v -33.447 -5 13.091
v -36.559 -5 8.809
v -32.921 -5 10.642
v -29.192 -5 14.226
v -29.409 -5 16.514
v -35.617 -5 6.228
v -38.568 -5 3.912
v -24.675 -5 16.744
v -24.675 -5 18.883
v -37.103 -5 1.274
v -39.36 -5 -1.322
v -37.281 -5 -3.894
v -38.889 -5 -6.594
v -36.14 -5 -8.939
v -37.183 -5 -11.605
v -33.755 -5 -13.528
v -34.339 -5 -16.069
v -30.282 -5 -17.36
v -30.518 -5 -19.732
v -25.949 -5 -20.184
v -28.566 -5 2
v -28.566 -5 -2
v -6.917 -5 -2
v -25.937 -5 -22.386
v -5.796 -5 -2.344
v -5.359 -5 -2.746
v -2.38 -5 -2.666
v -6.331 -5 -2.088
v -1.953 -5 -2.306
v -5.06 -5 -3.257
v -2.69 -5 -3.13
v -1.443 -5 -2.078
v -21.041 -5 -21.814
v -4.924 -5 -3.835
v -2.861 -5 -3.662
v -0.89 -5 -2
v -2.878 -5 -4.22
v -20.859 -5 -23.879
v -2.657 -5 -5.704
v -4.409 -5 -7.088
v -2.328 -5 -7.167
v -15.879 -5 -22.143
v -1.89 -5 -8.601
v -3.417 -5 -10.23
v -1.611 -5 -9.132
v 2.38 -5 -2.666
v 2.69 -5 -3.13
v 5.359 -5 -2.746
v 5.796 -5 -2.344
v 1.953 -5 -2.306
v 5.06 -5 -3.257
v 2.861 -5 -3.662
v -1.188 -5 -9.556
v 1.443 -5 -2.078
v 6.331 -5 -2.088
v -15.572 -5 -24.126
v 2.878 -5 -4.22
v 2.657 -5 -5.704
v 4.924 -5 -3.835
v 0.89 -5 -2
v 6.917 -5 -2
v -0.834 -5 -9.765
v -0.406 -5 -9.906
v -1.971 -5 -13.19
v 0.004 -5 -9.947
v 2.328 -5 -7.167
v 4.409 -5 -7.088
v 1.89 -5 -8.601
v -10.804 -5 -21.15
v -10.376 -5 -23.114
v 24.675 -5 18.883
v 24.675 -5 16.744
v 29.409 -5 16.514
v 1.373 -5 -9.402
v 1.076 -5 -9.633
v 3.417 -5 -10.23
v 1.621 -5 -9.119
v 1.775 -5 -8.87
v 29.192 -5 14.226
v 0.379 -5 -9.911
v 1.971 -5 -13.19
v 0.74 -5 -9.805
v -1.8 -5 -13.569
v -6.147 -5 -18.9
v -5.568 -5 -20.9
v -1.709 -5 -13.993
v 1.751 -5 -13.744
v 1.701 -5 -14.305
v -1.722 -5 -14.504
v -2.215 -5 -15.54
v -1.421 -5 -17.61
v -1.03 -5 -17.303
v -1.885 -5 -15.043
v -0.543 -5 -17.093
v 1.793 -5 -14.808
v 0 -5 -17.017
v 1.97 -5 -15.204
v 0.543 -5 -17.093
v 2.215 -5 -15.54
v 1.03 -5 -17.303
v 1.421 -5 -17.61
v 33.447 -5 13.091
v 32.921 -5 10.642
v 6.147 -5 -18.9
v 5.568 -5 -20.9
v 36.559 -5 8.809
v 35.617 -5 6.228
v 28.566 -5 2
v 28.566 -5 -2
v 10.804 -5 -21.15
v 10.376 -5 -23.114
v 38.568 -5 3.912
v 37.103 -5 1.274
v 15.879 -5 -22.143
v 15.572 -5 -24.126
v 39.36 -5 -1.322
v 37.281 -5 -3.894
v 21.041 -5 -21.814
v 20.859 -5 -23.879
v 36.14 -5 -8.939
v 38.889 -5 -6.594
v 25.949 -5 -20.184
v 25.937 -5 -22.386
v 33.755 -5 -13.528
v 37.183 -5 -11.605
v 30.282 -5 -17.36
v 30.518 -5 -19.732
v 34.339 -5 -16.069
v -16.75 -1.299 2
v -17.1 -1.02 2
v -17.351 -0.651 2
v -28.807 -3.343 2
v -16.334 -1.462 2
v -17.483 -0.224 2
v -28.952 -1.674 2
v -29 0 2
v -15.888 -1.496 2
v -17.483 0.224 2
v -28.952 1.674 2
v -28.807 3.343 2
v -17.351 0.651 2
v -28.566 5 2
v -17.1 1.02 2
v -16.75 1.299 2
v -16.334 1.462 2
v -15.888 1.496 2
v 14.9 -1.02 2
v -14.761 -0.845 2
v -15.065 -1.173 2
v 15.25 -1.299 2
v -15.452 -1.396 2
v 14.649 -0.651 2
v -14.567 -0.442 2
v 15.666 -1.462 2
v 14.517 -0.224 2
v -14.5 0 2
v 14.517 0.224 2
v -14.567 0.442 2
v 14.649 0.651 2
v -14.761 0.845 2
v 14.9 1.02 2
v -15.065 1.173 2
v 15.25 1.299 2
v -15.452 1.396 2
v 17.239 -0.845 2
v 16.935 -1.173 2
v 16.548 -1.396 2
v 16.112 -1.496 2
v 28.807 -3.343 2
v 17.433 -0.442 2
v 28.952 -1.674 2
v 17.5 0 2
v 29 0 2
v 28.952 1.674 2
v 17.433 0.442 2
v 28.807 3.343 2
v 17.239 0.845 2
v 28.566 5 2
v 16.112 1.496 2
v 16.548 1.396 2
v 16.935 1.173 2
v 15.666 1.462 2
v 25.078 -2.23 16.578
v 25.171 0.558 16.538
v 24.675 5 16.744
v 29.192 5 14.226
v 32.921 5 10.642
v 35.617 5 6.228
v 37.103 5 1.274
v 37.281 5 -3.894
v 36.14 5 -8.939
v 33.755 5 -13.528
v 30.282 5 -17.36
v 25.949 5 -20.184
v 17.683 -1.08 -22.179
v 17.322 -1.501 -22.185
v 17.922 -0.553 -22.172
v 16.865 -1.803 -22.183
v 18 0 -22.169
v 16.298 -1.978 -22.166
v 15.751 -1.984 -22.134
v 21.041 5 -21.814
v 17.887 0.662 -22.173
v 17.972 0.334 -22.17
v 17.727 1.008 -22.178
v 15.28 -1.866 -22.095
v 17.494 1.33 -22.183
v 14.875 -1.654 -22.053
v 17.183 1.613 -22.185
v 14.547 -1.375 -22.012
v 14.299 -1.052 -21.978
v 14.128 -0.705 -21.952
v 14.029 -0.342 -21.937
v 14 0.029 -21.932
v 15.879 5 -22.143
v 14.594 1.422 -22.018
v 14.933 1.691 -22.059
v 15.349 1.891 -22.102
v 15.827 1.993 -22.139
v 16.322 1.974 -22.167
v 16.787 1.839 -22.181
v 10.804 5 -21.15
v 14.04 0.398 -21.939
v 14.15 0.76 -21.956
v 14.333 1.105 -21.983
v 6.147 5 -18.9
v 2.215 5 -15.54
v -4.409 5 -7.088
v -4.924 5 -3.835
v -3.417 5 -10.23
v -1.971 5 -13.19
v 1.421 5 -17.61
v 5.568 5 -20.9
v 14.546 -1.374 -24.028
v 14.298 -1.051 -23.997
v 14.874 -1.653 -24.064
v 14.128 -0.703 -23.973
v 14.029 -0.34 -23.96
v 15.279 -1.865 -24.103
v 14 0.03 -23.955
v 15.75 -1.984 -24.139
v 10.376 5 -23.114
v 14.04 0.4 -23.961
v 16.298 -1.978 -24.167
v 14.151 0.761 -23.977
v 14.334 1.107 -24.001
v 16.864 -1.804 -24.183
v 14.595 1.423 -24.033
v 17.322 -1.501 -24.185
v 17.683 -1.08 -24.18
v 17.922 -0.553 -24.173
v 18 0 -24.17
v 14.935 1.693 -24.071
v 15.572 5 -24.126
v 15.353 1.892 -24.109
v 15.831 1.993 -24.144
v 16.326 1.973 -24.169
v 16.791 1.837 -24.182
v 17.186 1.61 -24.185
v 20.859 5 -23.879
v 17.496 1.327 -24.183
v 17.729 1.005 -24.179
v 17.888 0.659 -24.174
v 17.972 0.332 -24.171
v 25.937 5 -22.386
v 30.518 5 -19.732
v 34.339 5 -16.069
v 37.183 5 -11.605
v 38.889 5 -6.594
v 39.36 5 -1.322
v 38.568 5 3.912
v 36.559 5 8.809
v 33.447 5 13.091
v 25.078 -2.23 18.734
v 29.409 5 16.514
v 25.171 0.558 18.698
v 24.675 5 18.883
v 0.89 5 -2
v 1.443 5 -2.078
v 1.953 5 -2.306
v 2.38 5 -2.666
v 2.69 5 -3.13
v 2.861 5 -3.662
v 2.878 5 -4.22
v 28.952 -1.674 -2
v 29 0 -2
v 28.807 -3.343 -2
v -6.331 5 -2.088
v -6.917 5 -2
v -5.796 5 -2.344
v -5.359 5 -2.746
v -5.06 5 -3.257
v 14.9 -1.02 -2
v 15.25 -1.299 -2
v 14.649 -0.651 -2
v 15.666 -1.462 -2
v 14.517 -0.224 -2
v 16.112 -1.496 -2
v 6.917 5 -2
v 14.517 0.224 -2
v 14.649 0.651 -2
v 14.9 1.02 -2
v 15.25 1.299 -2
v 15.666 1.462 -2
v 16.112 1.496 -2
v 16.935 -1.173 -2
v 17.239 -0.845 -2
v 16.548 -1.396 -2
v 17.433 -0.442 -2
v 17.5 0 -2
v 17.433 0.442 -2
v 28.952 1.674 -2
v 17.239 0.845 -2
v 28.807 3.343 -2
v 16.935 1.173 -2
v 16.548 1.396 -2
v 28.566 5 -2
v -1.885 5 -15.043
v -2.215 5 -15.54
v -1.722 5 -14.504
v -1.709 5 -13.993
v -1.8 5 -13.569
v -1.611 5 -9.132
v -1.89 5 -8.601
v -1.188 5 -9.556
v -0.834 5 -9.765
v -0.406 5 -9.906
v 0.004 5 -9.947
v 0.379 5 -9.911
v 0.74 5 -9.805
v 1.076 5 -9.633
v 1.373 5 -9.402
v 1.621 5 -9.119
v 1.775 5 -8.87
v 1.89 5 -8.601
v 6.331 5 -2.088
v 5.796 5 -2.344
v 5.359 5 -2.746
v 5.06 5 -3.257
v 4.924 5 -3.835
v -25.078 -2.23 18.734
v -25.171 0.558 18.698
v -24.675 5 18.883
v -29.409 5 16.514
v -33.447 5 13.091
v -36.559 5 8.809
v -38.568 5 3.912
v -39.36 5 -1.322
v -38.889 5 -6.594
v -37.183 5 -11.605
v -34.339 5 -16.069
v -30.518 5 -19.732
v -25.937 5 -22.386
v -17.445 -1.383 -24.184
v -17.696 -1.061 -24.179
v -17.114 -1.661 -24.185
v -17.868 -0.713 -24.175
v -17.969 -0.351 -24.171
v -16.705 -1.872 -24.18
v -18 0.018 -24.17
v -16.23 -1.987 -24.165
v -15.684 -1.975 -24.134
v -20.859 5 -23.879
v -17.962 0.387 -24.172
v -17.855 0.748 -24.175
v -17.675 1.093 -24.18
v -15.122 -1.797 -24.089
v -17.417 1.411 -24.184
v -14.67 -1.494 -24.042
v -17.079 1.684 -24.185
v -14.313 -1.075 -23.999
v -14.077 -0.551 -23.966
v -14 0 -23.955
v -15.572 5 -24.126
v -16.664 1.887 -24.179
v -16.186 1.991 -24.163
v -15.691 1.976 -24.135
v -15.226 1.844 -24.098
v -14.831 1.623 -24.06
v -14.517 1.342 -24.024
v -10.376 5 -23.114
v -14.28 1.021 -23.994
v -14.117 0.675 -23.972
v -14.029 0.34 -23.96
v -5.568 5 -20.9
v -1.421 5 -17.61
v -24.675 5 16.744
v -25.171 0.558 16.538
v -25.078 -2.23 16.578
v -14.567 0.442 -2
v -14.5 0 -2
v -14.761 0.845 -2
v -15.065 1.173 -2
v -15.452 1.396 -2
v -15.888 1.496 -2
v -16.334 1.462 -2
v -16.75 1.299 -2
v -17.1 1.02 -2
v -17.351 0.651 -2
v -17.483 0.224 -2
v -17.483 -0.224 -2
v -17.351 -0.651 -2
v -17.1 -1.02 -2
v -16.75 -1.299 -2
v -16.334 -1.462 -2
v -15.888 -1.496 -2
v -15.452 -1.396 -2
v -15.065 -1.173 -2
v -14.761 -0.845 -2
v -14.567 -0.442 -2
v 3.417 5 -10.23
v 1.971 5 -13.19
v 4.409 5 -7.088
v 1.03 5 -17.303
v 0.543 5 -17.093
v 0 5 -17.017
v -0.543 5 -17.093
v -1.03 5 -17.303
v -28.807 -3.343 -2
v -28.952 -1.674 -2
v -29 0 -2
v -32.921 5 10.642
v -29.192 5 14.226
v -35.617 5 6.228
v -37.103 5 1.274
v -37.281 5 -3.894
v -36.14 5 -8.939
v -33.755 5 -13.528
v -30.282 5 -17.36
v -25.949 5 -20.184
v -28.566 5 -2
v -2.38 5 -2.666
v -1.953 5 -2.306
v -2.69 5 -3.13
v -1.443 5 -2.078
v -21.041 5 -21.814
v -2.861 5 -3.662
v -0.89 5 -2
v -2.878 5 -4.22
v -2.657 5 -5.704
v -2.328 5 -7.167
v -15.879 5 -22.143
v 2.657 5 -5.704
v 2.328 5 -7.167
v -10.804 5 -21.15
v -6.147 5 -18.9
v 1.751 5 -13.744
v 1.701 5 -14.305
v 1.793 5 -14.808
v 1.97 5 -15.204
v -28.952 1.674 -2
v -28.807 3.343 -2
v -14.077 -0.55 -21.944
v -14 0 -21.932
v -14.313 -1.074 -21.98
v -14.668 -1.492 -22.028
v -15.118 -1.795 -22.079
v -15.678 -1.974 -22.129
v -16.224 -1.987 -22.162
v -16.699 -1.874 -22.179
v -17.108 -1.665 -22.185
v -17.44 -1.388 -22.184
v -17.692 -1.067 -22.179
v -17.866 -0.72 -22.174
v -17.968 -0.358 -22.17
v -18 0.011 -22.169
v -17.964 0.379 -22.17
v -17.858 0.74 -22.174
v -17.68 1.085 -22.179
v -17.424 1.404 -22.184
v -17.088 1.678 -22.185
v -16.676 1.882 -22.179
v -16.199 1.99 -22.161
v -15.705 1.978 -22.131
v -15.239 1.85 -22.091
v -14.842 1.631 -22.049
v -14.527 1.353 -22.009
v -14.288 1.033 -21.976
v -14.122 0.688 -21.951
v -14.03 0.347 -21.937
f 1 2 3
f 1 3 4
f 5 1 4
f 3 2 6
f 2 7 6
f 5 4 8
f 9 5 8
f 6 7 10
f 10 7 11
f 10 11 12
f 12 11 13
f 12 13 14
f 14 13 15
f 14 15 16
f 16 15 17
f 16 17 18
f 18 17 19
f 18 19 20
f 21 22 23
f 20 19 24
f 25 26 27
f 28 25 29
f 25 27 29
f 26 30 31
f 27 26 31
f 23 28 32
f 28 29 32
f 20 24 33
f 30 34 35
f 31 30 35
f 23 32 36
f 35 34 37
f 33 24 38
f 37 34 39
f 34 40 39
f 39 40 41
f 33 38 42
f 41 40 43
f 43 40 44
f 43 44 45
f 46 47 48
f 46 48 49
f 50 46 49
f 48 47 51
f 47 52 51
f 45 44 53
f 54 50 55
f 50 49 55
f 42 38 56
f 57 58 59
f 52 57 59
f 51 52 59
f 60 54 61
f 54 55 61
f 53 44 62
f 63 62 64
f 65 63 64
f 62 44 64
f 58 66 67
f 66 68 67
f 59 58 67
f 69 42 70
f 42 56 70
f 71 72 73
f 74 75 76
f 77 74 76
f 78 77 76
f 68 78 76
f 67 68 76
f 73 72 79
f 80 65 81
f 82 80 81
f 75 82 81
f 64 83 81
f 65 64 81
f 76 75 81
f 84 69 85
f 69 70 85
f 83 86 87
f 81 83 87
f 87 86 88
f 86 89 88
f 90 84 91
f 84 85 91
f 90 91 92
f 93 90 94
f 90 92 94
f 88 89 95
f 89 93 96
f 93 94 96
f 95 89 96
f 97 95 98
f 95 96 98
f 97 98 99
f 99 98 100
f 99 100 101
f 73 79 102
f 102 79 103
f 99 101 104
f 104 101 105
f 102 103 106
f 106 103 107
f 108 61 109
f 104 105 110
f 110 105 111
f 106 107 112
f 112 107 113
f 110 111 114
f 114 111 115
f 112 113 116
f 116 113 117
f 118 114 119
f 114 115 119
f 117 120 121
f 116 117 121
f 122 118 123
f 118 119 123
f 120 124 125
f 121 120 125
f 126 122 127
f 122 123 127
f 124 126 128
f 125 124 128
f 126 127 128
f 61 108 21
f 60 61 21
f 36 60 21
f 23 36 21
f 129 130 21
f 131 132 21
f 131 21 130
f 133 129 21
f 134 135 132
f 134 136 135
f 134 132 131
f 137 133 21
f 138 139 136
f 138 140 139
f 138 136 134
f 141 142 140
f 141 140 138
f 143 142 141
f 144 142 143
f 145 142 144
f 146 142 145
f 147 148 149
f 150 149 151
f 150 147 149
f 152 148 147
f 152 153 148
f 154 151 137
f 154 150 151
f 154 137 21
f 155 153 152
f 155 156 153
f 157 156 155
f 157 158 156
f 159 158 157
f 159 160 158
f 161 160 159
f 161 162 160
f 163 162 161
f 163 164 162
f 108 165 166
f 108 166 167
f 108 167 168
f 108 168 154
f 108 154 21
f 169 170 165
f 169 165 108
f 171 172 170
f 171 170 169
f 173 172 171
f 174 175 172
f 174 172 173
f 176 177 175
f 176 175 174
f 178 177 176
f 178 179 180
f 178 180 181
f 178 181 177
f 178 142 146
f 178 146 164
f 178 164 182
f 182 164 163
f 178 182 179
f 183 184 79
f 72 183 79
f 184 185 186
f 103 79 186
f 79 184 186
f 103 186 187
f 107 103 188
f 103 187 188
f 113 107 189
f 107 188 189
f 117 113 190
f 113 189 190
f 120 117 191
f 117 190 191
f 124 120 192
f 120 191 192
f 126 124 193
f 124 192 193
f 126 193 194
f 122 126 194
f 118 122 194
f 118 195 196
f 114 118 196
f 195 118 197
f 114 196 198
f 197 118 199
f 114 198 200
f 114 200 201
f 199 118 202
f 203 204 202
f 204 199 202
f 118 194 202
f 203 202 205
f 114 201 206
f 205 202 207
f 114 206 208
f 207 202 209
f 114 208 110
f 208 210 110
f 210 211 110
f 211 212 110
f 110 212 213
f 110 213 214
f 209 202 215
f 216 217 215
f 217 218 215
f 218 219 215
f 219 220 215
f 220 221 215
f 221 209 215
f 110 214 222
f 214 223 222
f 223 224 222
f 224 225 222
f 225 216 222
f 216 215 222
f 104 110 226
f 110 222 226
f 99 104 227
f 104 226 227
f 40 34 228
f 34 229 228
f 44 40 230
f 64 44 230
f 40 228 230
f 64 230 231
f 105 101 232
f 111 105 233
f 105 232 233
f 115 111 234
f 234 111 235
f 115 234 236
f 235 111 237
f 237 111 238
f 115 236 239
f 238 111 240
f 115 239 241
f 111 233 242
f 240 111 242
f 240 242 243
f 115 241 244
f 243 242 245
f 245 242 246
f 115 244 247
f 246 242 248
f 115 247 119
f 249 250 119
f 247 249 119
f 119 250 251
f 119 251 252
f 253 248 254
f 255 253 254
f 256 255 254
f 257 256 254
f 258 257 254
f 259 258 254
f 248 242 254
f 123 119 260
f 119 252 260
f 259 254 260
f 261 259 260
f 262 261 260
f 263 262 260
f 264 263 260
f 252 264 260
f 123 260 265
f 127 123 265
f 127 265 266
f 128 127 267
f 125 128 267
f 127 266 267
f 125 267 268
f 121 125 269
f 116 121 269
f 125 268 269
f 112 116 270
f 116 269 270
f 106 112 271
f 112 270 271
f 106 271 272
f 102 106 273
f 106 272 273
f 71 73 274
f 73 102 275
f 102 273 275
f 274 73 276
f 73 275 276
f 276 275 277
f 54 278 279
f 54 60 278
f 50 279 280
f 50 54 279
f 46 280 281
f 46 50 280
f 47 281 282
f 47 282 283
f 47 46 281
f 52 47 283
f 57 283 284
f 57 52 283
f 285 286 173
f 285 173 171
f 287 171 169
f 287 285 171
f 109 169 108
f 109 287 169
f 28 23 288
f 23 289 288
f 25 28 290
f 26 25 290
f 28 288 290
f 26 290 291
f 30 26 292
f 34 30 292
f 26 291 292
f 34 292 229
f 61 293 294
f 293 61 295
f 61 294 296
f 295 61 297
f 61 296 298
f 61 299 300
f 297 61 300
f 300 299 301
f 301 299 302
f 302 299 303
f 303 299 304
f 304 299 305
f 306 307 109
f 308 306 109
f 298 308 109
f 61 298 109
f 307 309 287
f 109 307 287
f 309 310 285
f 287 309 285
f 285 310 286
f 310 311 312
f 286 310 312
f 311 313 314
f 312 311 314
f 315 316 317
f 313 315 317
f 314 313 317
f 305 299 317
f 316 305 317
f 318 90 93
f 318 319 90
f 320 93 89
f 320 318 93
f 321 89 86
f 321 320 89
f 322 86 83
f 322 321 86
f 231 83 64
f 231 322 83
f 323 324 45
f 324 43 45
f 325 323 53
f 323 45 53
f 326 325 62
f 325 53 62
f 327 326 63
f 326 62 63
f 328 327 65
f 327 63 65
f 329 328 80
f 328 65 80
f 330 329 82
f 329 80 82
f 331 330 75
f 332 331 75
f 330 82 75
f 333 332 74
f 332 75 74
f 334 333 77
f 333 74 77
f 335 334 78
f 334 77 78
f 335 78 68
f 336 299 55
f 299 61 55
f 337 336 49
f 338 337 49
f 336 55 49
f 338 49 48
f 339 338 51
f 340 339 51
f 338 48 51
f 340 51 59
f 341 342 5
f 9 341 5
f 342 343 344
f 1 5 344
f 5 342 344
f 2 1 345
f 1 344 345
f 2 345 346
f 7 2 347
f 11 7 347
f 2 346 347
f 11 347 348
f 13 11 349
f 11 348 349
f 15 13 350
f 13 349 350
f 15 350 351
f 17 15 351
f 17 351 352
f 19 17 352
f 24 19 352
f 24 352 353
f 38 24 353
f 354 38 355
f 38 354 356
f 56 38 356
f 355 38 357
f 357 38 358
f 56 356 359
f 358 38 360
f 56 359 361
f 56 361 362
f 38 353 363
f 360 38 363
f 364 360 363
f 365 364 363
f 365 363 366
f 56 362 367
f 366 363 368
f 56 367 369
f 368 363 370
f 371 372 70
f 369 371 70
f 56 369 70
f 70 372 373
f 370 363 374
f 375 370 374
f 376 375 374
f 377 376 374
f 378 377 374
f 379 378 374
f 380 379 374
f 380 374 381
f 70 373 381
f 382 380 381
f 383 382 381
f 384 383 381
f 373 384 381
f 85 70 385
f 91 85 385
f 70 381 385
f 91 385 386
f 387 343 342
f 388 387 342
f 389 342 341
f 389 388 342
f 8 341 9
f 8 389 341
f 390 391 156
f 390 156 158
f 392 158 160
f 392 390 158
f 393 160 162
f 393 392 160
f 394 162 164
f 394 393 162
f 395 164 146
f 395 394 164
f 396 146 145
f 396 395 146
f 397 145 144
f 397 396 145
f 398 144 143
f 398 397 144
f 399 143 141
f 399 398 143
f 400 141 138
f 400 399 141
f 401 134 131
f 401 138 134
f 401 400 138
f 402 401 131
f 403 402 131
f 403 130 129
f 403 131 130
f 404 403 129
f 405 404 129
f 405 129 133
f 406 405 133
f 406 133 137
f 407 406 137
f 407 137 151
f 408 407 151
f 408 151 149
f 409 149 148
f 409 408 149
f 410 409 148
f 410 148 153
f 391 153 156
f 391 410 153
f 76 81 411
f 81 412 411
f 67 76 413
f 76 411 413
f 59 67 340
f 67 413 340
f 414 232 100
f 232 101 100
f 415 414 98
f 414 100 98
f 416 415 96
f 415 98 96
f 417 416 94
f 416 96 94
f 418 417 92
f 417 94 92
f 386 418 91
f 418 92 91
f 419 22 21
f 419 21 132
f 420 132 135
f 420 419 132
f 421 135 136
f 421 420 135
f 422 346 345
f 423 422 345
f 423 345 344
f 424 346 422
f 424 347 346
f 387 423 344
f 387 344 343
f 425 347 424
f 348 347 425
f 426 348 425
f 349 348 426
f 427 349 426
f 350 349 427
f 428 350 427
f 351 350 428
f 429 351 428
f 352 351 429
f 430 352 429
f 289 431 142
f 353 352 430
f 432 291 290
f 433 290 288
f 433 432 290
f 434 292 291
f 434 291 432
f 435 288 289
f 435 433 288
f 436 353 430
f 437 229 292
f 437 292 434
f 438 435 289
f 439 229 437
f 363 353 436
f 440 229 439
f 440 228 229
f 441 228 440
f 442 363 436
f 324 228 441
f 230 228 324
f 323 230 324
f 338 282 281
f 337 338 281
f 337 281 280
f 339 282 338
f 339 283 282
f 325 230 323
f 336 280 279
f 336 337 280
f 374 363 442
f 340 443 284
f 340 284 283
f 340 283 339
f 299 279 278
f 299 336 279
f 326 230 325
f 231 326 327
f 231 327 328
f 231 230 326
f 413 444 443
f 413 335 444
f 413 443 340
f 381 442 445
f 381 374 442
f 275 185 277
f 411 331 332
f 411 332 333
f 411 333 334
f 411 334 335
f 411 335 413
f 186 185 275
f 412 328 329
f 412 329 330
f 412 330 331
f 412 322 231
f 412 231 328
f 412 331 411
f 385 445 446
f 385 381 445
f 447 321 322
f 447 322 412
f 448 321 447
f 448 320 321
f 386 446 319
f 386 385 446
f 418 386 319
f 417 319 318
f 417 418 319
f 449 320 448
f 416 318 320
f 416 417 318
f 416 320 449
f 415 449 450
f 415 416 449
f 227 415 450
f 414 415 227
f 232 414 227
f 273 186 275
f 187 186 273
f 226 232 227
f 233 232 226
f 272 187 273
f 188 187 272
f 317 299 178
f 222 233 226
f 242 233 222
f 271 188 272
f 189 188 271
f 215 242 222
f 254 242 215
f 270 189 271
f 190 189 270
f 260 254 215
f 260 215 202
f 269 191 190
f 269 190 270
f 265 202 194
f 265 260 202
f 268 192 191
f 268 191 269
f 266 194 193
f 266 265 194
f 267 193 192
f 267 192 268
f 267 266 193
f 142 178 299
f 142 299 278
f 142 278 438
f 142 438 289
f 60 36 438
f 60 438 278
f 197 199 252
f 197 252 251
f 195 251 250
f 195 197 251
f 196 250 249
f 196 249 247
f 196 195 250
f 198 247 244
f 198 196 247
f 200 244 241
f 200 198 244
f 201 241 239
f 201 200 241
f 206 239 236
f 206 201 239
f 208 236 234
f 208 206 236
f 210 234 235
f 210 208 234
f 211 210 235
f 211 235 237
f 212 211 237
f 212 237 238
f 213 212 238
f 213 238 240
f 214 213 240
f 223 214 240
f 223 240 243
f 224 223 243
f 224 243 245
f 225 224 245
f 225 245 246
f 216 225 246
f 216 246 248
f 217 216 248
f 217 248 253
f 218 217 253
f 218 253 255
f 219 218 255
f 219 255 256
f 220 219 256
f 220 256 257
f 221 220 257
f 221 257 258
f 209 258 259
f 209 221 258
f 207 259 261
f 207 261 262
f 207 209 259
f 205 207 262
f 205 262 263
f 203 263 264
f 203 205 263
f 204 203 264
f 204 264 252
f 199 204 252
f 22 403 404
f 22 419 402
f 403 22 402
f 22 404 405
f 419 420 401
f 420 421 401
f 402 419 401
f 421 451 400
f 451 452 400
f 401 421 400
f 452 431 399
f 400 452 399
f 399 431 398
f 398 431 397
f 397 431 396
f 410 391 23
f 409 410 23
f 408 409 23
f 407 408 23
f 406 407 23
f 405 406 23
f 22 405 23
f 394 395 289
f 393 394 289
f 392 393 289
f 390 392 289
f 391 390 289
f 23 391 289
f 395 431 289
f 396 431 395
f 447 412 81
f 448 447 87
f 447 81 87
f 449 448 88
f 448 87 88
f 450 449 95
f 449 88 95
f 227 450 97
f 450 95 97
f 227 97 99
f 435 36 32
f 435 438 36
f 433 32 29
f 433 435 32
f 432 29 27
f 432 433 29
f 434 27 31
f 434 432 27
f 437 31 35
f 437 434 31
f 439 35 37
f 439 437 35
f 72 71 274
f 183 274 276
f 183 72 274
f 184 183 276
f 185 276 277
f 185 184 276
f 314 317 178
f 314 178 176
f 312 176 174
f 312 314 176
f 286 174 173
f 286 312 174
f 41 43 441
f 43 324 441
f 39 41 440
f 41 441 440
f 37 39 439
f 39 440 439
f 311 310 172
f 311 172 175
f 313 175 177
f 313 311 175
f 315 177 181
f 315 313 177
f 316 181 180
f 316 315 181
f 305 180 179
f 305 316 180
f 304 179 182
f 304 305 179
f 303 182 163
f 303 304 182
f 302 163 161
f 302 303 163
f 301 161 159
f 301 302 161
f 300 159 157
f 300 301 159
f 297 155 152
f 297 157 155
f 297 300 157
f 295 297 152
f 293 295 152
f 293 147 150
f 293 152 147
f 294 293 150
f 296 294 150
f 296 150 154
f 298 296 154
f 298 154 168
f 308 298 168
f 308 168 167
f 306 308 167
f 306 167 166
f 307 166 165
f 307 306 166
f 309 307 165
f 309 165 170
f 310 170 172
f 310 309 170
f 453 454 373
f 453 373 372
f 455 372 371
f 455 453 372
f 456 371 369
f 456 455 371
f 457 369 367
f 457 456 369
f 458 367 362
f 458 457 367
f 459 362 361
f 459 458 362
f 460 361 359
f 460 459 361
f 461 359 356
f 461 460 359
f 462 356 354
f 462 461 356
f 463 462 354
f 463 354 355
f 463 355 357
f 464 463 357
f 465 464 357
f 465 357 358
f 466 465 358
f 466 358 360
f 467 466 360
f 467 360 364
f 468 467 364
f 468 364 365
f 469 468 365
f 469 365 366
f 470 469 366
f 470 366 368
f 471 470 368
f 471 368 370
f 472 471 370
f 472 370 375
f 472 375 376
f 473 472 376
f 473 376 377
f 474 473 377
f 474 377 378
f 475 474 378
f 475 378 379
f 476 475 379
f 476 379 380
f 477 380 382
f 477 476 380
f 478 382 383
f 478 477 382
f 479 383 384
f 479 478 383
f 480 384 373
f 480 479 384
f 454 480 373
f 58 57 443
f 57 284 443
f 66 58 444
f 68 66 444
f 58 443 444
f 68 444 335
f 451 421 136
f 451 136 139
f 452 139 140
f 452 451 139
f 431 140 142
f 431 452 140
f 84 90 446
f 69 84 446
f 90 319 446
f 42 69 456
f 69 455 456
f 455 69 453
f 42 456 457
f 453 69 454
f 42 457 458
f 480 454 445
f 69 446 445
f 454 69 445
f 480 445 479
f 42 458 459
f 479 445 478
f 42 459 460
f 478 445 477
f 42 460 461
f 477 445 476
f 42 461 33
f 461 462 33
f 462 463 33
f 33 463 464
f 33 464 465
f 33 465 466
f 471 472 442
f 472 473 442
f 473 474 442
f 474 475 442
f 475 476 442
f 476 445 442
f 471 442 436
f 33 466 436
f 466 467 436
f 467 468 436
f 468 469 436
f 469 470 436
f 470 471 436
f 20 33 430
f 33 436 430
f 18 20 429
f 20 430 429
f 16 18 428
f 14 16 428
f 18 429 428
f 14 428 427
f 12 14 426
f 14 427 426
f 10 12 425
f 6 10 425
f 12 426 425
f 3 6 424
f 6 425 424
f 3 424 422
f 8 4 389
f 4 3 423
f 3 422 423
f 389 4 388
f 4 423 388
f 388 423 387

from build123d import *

# Parameters (mm, degrees)
SKETCH2_W               = 58
SKETCH2_H               = 4
BOSS_EXTRUDE1_DEPTH     = 5
CUT_EXTRUDE4_START      = -2
CUT_EXTRUDE4_DEPTH      = 4
CUT_EXTRUDE8_DEPTH      = 30.495762408
CUT_EXTRUDE8_DEPTH_BACK = 30.495762408
SKETCH4_R               = 1.5
BOSS_EXTRUDE2_DEPTH     = 5
SKETCH6_R               = 25.176714318
CUT_EXTRUDE7_DEPTH      = 48.546713727
SKETCH8_R               = 2
CUT_EXTRUDE9_DEPTH      = 46.466564837
FILLET1_R               = 2


# Read off the part's stored shape, not the designer's step: Cut-Extrude4
with BuildPart() as part:
    # Sketch2 → Boss-Extrude1 (new, symmetric)
    with BuildSketch(Plane(origin=(0, 0, 0), x_dir=(1, 0, 0), z_dir=(0, 1, 0))):
        Rectangle(SKETCH2_W, SKETCH2_H)
    extrude(amount=BOSS_EXTRUDE1_DEPTH, both=True)

    # Cut-Extrude4 outline → Cut-Extrude4 (cut)
    with BuildSketch(Plane.XY.offset(CUT_EXTRUDE4_START)):
        with BuildLine():
            ThreePointArc((-29, 2.66e-07), (-28.891224415, 2.509412642), (-28.565713714, 5))
            Line((-28.565713714, 5), (-29, 5))
            Line((-29, 5), (-29, 2.66e-07))
        make_face()
        with BuildLine():
            ThreePointArc((-28.565713714, -5), (-28.891224438, -2.509412377), (-29, 2.66e-07))
            Line((-29, 2.66e-07), (-29, -5))
            Line((-29, -5), (-28.565713714, -5))
        make_face()
        with BuildLine():
            Line((29, 5), (28.565713714, 5))
            ThreePointArc((28.565713714, 5), (28.891224438, 2.509412377), (29, -2.66e-07))
            Line((29, -2.66e-07), (29, 5))
        make_face()
        with BuildLine():
            Line((29, -5), (29, -2.66e-07))
            ThreePointArc((29, -2.66e-07), (28.891224415, -2.509412642), (28.565713714, -5))
            Line((28.565713714, -5), (29, -5))
        make_face()
    extrude(amount=CUT_EXTRUDE4_DEPTH, mode=Mode.SUBTRACT)

    # Sketch4 → Cut-Extrude8 (cut, two sides: drawn at the far end of the back side and taken through both)
    with BuildSketch(Plane.XY.offset(-CUT_EXTRUDE8_DEPTH_BACK)):
        with Locations((16, 0)):
            Circle(SKETCH4_R)
        with Locations((-16, 0)):
            Circle(SKETCH4_R)
    extrude(amount=CUT_EXTRUDE8_DEPTH + CUT_EXTRUDE8_DEPTH_BACK, mode=Mode.SUBTRACT)

    # Sketch5 → Boss-Extrude2 (add, symmetric)
    with BuildSketch(Plane(origin=(0, 0, 0), x_dir=(1, 0, 0), z_dir=(0, 1, 0))):
        with BuildLine():
            Line((-24, -17), (-24.675229358, -18.882568807))
            ThreePointArc((-24.675229358, -18.882568807), (-29.952612974, 20.143186858), (5, 2))
            Line((5, 2), (3, 2))
            ThreePointArc((3, 2), (-28.801626162, 18.507574019), (-24, -17))
        make_face()
        with BuildLine():
            Line((-3, 2), (-5, 2))
            ThreePointArc((-5, 2), (29.952612974, 20.143186858), (24.675229358, -18.882568807))
            Line((24.675229358, -18.882568807), (24, -17))
            ThreePointArc((24, -17), (28.801626162, 18.507574019), (-3, 2))
        make_face()
    extrude(amount=BOSS_EXTRUDE2_DEPTH, both=True)

    # Sketch6 → Cut-Extrude7 (cut, through all)
    with BuildSketch(Plane.XY.offset(2)):
        Circle(SKETCH6_R)
    extrude(amount=CUT_EXTRUDE7_DEPTH, mode=Mode.SUBTRACT)

    # Sketch8 → Cut-Extrude9 (cut, through all)
    with BuildSketch(Plane(origin=(0, 0, -2), x_dir=(-1, 0, 0), z_dir=(0, 0, -1))):
        with Locations(Location((16, 0, 0), (0, 0, 180))):
            Circle(SKETCH8_R)
        with Locations(Location((-16, 0, 0), (0, 0, 180))):
            Circle(SKETCH8_R)
    extrude(amount=CUT_EXTRUDE9_DEPTH, mode=Mode.SUBTRACT)

    # Fillet1
    fillet1_edges = [part.edges().sort_by_distance(p)[0] for p in [
        (0, 0, -16.030390296),
        (0, 0, -12.58825345),
        (3, 0, -2),
        (5, 0, -2),
        (-5, 0, -2),
        (-3, 0, -2),
        (-1.232758621, 0, -14.367772138),
        (1.232758621, 0, -14.367772138),
    ]]
    fillet(fillet1_edges, radius=FILLET1_R)


solid = part.part
